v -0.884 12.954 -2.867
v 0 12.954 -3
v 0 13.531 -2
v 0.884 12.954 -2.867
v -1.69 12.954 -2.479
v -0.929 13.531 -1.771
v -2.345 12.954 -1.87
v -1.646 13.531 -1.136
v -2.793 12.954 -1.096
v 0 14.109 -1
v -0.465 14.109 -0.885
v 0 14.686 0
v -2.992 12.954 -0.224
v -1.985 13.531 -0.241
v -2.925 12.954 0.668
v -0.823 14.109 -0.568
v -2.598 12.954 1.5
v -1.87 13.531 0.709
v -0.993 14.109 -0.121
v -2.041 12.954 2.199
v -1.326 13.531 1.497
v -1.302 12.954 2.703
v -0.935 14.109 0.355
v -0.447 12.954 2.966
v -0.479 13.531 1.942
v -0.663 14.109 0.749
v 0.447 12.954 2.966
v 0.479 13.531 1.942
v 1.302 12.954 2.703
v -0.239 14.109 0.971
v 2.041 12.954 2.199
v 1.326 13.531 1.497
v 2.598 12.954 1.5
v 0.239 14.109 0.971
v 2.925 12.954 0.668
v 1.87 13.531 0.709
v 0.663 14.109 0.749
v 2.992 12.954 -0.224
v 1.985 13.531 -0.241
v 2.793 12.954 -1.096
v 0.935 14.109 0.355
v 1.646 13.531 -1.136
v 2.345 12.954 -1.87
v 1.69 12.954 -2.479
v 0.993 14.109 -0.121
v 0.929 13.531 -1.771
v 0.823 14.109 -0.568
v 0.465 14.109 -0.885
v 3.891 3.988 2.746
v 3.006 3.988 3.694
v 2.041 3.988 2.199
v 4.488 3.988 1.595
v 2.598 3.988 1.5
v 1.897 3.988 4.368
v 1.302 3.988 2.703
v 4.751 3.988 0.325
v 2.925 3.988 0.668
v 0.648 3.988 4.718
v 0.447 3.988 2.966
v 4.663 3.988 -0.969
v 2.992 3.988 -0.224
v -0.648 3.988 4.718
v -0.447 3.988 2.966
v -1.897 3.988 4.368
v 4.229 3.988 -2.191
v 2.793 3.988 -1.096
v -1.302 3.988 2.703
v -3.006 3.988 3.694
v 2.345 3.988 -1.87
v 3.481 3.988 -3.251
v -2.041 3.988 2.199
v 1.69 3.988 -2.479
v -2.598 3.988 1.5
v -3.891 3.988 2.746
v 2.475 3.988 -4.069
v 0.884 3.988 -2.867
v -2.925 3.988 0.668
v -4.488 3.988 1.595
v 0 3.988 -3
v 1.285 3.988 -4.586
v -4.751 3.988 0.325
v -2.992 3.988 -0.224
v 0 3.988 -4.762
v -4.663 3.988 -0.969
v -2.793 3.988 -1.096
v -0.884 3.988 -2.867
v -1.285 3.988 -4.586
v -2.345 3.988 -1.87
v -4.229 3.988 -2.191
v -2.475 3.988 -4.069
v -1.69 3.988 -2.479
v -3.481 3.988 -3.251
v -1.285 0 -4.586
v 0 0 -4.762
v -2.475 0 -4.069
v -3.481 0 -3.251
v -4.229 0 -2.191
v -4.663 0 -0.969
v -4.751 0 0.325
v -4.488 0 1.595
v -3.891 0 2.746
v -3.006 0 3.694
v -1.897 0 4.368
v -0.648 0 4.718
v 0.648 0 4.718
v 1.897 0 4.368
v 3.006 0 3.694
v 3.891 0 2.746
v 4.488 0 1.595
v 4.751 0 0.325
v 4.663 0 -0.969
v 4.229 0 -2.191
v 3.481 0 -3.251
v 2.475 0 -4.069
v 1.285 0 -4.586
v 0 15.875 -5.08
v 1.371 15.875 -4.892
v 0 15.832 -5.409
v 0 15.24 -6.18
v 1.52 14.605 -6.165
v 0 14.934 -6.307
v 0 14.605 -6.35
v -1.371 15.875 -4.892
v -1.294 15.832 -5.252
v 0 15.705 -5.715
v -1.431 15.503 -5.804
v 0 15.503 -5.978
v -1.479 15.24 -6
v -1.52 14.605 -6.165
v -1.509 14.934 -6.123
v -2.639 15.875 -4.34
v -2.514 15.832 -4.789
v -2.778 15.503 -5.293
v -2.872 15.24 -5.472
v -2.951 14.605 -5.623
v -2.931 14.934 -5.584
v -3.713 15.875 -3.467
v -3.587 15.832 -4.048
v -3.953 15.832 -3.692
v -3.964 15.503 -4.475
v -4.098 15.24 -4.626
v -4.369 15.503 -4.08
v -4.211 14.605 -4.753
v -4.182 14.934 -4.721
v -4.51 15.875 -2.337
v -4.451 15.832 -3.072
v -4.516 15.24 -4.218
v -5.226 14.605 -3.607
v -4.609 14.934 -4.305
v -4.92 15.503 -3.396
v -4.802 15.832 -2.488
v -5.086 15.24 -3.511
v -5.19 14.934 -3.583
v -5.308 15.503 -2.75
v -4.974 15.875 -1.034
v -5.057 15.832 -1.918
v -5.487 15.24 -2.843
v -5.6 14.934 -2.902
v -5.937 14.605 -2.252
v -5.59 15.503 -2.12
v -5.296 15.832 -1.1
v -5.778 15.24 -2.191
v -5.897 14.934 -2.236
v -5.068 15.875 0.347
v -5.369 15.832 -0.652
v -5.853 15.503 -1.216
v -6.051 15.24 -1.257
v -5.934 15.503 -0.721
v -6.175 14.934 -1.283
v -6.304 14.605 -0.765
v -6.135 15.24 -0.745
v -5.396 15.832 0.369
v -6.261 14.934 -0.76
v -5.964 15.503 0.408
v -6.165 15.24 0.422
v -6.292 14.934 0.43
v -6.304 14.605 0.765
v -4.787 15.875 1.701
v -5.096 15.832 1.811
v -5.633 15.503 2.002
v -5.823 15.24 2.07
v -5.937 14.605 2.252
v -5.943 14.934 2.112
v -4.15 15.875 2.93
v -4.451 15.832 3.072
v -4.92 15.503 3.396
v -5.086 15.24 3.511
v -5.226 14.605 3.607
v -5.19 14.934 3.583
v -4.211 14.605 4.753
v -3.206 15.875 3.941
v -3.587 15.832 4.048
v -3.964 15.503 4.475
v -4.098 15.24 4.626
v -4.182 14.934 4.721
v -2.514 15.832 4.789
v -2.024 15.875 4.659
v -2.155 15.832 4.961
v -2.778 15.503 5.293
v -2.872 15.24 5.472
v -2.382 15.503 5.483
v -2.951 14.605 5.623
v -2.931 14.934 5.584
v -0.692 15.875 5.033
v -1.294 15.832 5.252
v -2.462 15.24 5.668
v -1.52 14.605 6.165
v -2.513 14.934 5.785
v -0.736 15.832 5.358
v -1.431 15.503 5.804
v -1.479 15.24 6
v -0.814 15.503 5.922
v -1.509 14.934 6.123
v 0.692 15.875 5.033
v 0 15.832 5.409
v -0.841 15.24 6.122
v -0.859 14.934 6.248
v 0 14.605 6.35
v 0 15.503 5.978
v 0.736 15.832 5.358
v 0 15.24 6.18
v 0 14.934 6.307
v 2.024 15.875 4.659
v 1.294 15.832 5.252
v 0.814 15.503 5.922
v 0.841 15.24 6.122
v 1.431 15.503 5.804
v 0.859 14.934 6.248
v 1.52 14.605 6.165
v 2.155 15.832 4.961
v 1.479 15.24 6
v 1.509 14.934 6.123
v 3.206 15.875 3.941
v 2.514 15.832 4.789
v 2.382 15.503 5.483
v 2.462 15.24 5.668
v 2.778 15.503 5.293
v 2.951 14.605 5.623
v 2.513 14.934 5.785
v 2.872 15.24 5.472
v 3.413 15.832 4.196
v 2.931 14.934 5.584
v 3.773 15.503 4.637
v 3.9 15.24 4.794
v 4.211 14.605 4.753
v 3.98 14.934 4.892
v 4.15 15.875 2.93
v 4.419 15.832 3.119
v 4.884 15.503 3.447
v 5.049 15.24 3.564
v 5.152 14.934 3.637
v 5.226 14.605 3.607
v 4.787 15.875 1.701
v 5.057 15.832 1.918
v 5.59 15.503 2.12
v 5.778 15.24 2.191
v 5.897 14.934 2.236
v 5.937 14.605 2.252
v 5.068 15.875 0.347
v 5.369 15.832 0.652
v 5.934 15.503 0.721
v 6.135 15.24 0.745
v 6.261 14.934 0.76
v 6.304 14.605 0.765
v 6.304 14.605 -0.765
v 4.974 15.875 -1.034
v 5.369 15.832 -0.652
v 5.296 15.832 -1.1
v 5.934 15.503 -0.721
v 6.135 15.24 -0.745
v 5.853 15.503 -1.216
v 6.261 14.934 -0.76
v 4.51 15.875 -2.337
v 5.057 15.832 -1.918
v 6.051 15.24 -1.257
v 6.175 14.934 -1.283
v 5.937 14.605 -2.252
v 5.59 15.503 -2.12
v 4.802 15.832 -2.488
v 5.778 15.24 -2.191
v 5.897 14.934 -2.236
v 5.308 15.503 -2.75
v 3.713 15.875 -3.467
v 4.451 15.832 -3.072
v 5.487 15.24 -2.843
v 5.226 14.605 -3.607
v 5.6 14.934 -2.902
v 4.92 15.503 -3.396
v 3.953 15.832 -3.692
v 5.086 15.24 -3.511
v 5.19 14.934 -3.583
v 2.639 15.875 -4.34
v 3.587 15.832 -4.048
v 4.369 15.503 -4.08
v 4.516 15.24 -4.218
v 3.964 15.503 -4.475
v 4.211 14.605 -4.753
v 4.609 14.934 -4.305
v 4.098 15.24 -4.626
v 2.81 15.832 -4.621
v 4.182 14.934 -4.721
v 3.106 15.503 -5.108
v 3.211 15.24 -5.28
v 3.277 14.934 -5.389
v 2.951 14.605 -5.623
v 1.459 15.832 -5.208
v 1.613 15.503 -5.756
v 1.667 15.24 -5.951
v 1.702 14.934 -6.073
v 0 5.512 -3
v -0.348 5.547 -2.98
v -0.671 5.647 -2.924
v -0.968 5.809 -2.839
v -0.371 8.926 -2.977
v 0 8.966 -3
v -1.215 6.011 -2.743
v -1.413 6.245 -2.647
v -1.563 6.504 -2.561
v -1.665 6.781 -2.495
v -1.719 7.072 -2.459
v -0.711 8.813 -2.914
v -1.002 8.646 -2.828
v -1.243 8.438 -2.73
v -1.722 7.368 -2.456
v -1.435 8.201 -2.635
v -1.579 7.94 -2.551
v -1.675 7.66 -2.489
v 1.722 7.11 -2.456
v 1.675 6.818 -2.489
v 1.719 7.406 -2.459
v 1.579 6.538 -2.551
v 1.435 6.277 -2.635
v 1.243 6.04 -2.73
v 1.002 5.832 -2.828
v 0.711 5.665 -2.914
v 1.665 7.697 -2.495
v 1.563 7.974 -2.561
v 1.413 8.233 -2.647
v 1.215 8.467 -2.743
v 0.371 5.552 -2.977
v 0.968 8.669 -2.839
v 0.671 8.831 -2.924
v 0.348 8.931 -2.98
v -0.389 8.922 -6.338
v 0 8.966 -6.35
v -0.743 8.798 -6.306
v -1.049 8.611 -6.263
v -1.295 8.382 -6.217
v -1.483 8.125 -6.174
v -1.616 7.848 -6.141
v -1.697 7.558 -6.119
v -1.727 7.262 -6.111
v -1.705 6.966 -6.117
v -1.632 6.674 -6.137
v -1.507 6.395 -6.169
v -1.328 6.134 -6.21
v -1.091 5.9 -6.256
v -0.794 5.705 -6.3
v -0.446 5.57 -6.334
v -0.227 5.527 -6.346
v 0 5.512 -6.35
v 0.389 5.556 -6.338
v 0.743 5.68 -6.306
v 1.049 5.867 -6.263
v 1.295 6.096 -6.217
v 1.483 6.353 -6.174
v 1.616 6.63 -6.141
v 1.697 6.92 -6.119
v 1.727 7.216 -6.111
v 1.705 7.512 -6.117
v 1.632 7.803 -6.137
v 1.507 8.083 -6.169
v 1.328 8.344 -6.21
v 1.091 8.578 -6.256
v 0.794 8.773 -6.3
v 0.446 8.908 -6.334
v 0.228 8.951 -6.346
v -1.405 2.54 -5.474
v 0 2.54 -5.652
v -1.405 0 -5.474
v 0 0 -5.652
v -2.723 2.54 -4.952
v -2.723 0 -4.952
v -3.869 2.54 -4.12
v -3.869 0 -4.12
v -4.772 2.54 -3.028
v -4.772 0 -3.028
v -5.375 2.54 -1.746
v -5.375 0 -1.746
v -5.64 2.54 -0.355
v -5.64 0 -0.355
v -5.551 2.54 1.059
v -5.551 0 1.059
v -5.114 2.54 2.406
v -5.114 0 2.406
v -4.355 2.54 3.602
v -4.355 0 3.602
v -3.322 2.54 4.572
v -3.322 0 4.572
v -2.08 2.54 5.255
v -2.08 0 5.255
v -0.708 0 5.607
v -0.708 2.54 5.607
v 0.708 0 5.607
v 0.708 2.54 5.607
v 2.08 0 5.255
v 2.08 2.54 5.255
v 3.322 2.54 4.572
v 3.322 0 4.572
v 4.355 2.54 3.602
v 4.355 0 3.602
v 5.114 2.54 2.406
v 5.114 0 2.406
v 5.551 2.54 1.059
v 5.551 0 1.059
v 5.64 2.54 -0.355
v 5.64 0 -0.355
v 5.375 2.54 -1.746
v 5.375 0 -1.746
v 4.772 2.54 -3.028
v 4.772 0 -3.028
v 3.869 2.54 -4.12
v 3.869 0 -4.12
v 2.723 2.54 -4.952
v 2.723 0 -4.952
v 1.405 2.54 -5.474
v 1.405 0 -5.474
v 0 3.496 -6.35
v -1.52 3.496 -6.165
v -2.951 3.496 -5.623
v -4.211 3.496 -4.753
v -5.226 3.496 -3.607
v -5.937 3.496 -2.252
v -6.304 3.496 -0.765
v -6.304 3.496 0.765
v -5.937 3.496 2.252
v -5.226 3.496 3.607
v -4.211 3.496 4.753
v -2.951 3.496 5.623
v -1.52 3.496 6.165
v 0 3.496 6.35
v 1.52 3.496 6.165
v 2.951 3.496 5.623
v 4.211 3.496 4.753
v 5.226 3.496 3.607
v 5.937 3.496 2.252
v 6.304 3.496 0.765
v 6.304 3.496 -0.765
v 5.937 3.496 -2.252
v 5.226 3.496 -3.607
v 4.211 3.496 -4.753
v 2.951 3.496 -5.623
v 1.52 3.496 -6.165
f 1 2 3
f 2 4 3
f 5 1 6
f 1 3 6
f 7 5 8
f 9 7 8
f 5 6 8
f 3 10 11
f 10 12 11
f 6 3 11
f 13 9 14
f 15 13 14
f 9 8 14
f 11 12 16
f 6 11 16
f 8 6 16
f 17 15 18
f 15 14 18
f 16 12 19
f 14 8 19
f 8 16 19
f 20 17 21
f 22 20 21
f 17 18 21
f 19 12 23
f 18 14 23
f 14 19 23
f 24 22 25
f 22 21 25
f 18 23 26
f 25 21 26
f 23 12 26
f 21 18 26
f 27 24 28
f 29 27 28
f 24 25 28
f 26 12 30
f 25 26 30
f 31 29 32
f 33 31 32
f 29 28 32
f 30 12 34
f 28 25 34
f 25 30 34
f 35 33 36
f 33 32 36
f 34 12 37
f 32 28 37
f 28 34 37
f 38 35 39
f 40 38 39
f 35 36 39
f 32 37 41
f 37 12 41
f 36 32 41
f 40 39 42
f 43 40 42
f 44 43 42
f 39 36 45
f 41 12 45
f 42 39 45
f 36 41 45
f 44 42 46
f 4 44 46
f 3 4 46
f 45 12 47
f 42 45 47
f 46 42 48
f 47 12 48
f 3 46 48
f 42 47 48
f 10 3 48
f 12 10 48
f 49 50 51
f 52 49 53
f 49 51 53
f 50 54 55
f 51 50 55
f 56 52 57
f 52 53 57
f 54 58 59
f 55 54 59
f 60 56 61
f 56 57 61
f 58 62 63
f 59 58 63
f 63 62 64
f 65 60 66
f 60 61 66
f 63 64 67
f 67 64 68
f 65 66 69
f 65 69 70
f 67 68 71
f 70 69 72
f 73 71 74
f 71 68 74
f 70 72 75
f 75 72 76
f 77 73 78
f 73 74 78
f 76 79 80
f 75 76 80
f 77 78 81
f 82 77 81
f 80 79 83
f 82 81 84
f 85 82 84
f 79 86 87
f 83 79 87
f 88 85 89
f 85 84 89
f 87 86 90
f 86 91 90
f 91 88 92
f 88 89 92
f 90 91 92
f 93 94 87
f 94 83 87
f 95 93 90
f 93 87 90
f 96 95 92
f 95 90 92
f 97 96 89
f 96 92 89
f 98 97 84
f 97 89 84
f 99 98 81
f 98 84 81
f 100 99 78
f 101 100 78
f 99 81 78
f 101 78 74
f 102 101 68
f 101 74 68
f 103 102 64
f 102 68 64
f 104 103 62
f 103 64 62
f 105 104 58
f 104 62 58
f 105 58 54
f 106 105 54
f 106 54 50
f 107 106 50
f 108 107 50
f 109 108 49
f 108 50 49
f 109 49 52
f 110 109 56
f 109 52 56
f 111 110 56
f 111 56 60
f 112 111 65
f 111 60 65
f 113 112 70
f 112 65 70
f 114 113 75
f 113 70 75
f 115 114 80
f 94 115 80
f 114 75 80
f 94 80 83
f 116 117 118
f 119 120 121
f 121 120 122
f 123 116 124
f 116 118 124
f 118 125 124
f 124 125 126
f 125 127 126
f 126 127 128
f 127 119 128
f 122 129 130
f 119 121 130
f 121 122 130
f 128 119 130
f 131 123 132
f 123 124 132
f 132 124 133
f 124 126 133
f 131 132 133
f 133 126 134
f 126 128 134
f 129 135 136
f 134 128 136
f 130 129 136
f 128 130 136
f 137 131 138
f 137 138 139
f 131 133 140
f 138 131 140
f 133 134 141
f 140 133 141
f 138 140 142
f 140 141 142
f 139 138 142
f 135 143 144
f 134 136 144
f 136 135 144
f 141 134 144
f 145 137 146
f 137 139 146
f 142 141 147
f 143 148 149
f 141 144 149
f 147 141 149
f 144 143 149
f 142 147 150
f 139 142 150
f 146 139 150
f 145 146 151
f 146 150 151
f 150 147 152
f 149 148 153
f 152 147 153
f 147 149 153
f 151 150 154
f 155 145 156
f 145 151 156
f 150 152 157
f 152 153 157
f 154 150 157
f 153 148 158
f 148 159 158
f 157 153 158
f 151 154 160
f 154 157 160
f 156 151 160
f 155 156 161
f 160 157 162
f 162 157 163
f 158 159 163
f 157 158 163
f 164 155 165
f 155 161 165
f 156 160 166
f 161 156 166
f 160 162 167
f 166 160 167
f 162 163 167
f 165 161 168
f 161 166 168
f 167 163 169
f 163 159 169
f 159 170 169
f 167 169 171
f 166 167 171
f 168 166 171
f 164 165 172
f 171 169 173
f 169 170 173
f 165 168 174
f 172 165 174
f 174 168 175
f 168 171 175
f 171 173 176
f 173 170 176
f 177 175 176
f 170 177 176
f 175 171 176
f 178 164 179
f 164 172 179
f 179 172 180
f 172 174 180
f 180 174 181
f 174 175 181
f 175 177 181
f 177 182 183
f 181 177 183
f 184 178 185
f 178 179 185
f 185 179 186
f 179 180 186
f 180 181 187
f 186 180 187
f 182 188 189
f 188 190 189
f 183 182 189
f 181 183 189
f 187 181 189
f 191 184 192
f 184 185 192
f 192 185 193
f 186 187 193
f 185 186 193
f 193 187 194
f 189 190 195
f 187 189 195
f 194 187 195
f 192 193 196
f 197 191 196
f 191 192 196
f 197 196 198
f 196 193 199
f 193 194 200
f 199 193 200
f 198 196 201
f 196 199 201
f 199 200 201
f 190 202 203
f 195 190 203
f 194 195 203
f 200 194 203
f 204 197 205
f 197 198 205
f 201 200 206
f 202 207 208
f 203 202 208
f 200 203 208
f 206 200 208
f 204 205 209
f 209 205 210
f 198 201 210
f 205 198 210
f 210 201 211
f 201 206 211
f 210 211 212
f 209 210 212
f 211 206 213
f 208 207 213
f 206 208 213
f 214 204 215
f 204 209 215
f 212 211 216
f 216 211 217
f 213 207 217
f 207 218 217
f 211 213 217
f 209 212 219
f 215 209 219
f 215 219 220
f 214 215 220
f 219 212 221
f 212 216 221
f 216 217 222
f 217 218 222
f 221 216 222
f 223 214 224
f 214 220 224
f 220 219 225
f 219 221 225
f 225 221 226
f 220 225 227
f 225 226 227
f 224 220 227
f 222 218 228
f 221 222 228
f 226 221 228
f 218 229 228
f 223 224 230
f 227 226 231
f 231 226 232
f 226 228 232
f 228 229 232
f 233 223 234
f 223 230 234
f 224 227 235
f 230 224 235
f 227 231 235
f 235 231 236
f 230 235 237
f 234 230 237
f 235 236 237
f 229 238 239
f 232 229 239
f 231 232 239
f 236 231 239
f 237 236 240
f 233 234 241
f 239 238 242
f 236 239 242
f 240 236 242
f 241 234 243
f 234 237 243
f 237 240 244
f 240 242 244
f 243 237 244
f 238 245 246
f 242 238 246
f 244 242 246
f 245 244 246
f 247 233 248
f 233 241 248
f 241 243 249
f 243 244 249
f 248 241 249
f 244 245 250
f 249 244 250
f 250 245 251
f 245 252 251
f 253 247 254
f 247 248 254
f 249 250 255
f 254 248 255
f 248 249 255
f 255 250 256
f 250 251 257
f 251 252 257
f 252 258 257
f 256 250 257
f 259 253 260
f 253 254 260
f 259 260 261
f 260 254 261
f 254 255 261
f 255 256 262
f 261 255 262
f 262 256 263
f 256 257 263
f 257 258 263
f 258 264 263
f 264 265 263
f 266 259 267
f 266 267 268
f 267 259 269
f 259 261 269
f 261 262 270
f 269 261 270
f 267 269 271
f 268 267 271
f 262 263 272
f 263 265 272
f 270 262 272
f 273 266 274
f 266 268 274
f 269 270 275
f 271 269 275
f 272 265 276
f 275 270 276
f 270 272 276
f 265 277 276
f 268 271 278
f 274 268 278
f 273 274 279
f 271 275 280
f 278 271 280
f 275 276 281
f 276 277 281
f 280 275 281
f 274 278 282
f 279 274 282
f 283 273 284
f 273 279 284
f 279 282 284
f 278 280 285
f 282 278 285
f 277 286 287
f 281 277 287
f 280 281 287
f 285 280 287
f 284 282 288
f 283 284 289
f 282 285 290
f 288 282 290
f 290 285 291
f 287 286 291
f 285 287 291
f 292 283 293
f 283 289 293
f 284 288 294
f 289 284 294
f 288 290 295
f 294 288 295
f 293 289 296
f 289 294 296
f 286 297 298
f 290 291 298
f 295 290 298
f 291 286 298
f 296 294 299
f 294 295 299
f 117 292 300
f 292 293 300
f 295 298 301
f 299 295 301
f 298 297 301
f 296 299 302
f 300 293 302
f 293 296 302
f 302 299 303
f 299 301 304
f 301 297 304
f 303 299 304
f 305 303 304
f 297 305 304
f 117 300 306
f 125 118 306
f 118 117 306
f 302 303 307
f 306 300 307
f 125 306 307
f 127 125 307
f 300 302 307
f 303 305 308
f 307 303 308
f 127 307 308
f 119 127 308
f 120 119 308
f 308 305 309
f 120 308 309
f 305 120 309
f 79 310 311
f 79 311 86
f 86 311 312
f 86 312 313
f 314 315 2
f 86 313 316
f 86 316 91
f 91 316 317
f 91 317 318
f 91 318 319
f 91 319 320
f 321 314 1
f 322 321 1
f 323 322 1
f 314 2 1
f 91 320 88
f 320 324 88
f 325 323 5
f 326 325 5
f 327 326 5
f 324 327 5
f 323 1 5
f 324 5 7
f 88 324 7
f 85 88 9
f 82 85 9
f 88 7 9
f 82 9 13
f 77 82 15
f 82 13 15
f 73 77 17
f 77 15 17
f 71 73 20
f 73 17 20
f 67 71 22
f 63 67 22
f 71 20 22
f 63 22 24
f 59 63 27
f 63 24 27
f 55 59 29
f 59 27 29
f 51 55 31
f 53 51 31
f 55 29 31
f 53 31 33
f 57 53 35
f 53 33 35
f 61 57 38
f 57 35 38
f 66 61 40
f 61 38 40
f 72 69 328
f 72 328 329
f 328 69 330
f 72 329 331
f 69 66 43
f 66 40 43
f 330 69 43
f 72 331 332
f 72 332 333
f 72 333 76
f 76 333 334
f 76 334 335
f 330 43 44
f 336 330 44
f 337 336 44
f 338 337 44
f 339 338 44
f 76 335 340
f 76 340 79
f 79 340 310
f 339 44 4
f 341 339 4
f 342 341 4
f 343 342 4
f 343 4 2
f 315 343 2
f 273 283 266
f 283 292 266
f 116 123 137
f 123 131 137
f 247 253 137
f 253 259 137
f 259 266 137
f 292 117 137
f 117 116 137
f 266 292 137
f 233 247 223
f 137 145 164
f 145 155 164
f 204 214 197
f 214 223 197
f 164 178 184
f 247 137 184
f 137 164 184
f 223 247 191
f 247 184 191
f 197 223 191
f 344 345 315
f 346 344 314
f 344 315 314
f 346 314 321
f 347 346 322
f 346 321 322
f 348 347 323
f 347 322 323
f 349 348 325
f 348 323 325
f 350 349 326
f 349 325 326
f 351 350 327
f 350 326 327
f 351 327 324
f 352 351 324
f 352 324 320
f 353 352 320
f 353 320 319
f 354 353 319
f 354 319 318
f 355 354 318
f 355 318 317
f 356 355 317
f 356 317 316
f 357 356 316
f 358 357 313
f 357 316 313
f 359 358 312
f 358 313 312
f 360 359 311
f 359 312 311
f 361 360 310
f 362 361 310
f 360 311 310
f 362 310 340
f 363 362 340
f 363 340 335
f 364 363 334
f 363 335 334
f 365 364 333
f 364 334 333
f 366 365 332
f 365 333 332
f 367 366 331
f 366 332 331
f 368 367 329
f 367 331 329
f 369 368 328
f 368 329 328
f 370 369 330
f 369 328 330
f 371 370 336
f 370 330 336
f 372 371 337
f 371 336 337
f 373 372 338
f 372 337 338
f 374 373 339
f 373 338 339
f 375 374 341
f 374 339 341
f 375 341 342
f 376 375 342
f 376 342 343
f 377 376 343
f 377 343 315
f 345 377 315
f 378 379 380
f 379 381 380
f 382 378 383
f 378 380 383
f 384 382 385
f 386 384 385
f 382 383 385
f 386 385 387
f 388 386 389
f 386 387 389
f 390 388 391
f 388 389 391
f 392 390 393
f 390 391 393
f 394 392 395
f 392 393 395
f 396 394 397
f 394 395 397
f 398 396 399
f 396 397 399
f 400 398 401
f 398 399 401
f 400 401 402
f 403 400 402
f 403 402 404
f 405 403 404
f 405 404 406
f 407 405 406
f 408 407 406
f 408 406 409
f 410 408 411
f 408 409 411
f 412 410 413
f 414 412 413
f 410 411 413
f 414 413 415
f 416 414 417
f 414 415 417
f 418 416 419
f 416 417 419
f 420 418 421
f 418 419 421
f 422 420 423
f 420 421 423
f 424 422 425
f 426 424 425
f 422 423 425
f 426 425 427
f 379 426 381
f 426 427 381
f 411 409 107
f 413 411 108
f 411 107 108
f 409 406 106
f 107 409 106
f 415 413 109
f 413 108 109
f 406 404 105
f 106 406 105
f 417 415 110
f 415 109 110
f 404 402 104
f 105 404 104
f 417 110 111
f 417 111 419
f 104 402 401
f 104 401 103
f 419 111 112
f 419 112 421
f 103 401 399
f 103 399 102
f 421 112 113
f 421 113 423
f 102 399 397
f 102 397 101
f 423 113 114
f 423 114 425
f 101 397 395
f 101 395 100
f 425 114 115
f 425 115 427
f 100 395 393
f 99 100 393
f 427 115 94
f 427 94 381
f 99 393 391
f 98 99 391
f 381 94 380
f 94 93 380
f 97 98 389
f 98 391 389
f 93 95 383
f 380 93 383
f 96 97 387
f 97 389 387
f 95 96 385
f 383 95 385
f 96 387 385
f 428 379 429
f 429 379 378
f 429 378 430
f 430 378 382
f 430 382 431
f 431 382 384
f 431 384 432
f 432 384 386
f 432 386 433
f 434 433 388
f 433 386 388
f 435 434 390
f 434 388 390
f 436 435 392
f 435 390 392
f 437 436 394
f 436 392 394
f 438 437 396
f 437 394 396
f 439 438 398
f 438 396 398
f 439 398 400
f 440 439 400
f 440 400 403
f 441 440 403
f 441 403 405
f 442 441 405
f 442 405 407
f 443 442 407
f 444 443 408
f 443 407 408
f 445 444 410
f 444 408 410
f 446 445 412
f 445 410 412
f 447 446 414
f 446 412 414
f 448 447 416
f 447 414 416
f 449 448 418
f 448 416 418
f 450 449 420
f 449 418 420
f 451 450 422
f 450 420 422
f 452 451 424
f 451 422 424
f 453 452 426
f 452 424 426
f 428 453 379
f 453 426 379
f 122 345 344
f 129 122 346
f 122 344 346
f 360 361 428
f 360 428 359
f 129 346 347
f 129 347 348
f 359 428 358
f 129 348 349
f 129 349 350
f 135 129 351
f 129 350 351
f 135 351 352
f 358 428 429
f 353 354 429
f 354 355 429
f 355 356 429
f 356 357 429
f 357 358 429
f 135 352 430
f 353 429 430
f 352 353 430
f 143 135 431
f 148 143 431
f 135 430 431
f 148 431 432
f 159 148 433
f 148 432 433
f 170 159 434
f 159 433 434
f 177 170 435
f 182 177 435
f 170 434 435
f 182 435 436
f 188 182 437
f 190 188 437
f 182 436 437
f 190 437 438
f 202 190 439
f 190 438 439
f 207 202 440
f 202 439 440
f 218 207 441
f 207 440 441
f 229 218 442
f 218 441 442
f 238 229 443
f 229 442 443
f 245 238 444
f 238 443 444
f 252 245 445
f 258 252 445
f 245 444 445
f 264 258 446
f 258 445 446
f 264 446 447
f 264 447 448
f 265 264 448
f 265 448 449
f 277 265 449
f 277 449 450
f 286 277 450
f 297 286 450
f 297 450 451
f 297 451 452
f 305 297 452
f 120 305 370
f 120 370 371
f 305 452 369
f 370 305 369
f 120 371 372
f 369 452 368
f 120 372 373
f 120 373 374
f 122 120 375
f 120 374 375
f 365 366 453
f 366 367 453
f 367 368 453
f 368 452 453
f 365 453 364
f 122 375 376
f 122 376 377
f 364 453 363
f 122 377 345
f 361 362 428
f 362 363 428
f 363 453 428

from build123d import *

# Parameters (mm, degrees)
SKETCH2_R          = 1.7272
CUT_EXTRUDE1_DEPTH = 7.35


with BuildPart() as part:
    # Sketch1 → Revolve1 (revolve)
    with BuildSketch(Plane.XY, mode=Mode.PRIVATE) as revolve1_sk:
        with BuildLine():
            Line((3, 3.9878), (3, 12.954))
            Line((3, 12.954), (0, 14.686050808))
            Line((0, 14.686050808), (0, 15.875))
            Line((0, 15.875), (5.08, 15.875))
            ThreePointArc((5.08, 15.875), (5.978025612, 15.503025612), (6.35, 14.605))
            Line((6.35, 14.605), (6.35, 3.495842105))
            Line((6.35, 3.495842105), (5.6515, 2.54))
            Line((5.6515, 2.54), (5.6515, 0))
            Line((5.6515, 0), (4.7625, 0))
            Line((4.7625, 0), (4.7625, 3.9878))
            Line((4.7625, 3.9878), (3, 3.9878))
        make_face()
    revolve(revolve1_sk.sketch.rotate(Axis((0, 0, 0), (0, 1, 0)), 90), axis=Axis((0, 0, 0), (0, 1, 0)))  # turned: the seam where the file's is

    # Sketch2 → Cut-Extrude1 (cut, through all)
    with BuildSketch(Plane.XY):
        with Locations(Location((0, 7.239, 0), (0, 0, 90))):  # turned: the seam where the file's is
            Circle(SKETCH2_R)
    extrude(amount=-CUT_EXTRUDE1_DEPTH, mode=Mode.SUBTRACT)


solid = part.part
